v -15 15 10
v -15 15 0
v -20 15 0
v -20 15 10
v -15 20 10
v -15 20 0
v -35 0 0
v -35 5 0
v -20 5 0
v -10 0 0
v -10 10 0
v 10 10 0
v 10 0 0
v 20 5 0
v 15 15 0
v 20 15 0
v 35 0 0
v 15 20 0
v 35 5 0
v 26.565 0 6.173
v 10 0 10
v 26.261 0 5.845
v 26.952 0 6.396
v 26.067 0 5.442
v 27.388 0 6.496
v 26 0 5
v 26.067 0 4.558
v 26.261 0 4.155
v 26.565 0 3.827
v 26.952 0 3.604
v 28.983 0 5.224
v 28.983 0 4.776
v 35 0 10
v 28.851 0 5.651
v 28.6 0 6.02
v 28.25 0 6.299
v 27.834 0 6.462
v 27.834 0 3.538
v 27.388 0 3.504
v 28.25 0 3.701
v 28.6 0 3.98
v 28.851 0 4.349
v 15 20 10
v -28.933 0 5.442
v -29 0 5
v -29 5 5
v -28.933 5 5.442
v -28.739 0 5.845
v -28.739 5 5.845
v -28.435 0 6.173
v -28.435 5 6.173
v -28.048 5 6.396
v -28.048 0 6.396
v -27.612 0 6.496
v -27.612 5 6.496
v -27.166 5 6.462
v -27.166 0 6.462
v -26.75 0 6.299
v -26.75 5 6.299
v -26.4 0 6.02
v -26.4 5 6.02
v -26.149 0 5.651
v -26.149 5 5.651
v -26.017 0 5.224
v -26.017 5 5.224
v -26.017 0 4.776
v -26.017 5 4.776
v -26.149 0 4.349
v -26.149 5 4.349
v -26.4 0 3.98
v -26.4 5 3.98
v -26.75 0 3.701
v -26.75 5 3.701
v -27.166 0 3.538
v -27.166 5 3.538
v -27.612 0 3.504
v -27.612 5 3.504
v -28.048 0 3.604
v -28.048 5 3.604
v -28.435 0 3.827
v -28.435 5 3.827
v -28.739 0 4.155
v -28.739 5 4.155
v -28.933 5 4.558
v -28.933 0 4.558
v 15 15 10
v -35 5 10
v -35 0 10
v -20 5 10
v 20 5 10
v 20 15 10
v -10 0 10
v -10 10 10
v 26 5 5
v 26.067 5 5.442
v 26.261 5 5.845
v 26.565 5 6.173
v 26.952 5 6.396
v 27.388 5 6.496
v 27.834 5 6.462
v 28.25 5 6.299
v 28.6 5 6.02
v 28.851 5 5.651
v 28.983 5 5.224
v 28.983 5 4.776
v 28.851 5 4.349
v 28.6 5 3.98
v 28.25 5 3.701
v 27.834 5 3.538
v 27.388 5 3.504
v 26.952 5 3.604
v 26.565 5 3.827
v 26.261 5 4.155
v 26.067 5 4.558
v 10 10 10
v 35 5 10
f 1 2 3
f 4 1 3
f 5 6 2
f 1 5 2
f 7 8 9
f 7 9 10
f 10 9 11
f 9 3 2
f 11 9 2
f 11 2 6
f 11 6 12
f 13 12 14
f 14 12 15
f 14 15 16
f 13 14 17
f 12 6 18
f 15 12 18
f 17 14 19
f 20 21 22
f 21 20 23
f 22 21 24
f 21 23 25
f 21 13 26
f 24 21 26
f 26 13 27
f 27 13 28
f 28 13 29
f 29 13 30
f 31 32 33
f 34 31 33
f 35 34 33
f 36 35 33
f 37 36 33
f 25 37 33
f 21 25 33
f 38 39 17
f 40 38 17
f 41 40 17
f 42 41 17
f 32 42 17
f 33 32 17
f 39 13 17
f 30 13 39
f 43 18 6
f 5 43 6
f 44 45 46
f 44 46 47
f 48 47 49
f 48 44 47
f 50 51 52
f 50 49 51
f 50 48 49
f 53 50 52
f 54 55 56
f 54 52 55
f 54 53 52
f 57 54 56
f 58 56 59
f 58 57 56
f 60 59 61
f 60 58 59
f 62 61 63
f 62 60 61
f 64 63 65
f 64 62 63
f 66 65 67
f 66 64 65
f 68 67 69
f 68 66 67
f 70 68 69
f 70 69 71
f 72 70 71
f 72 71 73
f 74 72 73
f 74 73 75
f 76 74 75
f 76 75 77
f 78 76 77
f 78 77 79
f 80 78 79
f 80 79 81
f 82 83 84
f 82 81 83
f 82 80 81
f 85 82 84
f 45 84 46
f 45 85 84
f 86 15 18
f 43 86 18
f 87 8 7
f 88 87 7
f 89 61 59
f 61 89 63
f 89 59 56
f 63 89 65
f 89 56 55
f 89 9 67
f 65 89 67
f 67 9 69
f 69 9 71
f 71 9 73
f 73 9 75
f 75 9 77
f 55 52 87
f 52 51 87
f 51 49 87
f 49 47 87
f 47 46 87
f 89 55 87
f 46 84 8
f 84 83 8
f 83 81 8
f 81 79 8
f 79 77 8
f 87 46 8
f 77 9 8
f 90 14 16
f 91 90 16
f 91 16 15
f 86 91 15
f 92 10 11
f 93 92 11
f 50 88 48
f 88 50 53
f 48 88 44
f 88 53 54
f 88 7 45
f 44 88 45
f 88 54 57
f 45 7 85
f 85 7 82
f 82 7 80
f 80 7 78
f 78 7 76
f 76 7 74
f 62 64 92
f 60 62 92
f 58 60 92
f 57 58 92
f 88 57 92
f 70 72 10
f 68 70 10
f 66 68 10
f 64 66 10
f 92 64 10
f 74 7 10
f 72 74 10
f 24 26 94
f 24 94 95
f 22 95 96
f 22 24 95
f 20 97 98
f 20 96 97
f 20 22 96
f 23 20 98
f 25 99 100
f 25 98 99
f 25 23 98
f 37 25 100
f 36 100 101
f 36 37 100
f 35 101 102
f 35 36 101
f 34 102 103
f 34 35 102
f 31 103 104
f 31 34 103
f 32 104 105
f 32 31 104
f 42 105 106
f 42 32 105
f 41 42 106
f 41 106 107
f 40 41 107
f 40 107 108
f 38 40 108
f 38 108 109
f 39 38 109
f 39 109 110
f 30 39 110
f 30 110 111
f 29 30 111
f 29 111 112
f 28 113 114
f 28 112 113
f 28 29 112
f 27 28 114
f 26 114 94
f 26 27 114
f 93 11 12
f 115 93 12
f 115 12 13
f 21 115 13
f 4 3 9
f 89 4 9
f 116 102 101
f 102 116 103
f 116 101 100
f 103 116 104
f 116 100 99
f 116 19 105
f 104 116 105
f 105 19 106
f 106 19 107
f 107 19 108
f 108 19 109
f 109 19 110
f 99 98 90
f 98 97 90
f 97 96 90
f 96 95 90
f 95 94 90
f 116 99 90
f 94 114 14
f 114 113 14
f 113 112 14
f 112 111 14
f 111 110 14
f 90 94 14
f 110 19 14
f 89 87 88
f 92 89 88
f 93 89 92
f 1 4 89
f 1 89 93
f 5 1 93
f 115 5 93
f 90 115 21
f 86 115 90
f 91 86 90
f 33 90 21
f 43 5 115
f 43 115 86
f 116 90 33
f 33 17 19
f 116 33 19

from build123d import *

# Parameters (mm, degrees)
EXTRUDE_1_DEPTH          = 10
CUT_EXTRUDE_1_DEPTH      = 40.37003937
CUT_EXTRUDE_1_DEPTH_BACK = 40.37003937
SKETCH_2_R               = 1.5


with BuildPart() as part:
    # 草图1 → 凸台-拉伸1 (new body)
    with BuildSketch(Plane.XY):
        Polygon((-20, 0), (-10, 0), (-10, 10), (10, 10), (10, 0), (20, 0), (35, 0), (35, 5), (20, 5), (20, 15), (15, 15), (15, 20), (-15, 20), (-15, 15), (-20, 15), (-20, 5), (-35, 5), (-35, 0), align=None)
    extrude(amount=EXTRUDE_1_DEPTH)

    # 草图2 → 切除-拉伸1 (cut, two sides: drawn at the far end of the back side and taken through both)
    with BuildSketch(Plane(origin=(0, 5, 0), x_dir=(1, 0, 0), z_dir=(0, 1, 0)).offset(-CUT_EXTRUDE_1_DEPTH_BACK)):
        with Locations(Location((-27.5, -5, 0), (0, 0, 180))):
            Circle(SKETCH_2_R)
        with Locations(Location((27.5, -5, 0), (0, 0, 180))):
            Circle(SKETCH_2_R)
    extrude(amount=CUT_EXTRUDE_1_DEPTH + CUT_EXTRUDE_1_DEPTH_BACK, mode=Mode.SUBTRACT)


solid = part.part
